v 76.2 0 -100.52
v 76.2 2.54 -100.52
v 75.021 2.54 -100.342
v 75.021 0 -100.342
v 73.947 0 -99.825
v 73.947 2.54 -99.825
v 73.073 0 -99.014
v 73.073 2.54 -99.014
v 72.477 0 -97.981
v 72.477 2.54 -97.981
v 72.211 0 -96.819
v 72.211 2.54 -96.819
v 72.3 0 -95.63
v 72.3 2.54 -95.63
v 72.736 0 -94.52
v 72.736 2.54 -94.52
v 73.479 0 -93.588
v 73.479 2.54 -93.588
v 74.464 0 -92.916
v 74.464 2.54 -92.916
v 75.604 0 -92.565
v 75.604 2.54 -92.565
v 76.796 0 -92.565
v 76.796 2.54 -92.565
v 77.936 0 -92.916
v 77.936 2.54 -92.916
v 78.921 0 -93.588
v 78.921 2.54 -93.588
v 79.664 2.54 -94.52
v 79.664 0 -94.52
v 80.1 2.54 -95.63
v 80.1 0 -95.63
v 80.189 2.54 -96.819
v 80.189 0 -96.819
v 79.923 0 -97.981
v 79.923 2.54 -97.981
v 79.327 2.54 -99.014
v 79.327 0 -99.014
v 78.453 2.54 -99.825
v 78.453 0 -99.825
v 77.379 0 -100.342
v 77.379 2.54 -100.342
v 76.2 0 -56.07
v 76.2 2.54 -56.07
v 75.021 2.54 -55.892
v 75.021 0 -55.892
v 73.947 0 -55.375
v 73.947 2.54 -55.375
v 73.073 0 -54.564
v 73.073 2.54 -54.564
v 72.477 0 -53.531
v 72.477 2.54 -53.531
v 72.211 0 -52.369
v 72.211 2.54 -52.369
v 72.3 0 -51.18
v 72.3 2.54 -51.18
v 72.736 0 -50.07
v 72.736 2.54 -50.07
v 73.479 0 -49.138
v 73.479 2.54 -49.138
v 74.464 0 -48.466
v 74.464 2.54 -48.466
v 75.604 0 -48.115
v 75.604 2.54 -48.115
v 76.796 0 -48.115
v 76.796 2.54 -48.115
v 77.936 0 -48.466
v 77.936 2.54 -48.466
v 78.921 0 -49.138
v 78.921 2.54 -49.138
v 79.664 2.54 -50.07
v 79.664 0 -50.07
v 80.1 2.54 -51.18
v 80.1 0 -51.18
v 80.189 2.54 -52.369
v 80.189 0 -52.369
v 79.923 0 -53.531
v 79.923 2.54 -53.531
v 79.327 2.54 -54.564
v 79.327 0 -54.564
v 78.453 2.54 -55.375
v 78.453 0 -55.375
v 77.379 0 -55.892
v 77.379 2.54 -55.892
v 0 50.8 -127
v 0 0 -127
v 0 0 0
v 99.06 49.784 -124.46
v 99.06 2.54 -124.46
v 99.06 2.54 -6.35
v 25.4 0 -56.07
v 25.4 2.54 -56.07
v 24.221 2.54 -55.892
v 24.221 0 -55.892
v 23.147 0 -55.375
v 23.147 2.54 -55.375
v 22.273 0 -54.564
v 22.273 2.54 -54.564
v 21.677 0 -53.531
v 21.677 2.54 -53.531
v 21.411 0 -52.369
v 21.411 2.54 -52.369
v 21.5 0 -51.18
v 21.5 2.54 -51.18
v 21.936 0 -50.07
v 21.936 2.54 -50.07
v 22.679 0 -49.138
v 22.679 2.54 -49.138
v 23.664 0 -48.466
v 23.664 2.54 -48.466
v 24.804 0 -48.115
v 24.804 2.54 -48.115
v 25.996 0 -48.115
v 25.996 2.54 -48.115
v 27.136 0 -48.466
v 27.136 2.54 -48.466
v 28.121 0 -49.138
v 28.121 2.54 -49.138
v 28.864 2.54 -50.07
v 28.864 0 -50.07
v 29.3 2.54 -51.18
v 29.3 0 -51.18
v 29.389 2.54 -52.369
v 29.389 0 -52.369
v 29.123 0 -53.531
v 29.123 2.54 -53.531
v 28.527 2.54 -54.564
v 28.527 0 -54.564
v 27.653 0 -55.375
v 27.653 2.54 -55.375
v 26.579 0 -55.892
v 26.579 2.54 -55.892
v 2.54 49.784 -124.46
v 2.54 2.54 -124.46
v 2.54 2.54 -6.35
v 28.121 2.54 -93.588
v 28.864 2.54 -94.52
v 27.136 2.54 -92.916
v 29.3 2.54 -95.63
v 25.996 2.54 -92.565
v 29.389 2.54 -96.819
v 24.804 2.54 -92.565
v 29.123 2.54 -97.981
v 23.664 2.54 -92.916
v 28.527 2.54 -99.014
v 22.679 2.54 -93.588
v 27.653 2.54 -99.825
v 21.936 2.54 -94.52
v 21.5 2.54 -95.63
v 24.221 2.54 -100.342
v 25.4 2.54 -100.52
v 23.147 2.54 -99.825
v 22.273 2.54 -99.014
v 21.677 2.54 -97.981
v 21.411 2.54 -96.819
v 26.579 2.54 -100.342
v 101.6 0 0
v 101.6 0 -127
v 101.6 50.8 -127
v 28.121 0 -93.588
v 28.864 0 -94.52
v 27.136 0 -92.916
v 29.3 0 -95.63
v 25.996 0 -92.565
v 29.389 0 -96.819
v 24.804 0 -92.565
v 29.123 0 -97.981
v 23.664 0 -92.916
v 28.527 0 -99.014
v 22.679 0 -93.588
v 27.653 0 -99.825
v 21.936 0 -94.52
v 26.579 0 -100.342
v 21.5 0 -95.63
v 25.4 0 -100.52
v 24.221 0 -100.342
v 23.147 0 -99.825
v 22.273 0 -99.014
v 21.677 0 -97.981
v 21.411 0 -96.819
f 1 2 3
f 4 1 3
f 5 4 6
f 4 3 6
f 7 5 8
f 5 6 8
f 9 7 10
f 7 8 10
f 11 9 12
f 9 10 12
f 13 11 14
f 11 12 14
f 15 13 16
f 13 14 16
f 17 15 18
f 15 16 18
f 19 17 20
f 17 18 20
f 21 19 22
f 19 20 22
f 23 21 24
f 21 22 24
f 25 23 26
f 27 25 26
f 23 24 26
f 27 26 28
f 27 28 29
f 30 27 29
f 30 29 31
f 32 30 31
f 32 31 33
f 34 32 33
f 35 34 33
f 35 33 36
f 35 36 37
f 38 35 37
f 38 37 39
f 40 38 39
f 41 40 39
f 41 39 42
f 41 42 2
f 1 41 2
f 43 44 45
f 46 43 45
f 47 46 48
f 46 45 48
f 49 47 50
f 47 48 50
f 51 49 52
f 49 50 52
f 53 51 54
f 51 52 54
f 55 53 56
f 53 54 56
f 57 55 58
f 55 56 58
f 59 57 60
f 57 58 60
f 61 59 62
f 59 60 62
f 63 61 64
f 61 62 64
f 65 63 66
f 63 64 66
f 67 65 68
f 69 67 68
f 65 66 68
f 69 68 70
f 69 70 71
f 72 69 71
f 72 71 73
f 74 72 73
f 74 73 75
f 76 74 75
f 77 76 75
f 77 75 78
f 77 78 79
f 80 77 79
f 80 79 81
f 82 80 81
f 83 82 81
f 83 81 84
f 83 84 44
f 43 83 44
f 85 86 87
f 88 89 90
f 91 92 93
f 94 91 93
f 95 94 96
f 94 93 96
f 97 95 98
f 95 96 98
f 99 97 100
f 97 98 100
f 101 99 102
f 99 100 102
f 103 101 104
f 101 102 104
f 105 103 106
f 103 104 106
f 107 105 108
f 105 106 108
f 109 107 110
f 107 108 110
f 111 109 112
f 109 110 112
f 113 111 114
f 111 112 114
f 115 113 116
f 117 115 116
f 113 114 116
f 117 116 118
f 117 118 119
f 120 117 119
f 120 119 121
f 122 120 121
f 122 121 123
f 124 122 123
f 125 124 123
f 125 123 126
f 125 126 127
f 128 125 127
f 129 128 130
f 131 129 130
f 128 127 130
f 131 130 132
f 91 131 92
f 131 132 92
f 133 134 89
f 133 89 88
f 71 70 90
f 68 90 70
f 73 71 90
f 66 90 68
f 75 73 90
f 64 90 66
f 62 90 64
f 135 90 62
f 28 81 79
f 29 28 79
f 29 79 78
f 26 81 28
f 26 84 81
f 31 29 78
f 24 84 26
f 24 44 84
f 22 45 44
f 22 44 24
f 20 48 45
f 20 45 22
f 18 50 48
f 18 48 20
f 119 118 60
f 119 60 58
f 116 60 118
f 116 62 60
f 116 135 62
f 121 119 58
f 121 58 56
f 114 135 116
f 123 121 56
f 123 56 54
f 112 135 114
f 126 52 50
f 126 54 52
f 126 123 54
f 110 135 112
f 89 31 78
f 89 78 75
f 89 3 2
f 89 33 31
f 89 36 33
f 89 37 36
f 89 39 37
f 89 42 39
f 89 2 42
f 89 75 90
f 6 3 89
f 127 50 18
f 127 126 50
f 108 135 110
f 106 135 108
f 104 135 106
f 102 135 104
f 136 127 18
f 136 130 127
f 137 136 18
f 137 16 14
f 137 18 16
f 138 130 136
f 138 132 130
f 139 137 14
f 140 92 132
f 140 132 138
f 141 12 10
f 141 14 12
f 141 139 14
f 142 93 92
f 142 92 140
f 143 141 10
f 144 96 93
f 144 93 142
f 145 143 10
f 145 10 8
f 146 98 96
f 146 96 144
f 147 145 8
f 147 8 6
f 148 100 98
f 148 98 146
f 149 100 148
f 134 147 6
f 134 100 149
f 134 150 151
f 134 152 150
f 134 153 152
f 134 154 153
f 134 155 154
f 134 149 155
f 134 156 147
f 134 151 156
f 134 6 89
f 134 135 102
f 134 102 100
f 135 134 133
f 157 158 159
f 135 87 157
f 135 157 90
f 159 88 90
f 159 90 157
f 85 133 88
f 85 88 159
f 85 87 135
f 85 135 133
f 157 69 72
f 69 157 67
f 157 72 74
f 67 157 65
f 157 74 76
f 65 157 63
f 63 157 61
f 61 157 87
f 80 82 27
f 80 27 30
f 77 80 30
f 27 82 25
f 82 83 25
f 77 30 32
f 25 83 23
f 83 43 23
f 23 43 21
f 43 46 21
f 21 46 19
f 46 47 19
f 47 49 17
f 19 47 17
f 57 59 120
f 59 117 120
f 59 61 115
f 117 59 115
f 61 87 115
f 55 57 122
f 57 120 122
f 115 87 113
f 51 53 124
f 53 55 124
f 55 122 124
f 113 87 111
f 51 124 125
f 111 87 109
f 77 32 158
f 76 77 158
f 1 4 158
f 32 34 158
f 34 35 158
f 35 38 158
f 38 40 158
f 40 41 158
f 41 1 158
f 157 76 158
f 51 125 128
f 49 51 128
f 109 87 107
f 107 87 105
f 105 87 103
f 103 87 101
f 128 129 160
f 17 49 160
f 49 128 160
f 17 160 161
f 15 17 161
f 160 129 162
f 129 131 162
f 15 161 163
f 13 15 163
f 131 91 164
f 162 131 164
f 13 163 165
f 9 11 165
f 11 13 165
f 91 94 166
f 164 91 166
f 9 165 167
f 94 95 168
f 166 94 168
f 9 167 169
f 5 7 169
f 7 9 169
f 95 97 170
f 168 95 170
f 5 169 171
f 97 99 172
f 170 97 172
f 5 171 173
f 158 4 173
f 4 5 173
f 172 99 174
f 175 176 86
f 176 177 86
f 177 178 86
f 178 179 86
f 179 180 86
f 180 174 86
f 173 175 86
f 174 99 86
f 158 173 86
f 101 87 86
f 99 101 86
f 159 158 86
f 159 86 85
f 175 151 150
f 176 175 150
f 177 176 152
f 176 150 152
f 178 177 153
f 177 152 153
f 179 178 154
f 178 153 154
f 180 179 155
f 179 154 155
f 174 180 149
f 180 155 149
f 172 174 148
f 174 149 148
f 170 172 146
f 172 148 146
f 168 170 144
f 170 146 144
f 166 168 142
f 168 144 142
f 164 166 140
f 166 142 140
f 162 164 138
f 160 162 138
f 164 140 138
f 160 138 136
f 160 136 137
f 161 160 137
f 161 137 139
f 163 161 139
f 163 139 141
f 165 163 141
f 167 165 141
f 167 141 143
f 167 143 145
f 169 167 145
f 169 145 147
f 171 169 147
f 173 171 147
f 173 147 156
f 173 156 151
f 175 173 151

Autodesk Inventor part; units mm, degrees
ref_plane "YZ Plane" through (0, 0, 0) normal (1, 0, 0) x (0, 1, 0)
ref_plane "XZ Plane" through (0, 0, 0) normal (0, 1, 0) x (-1, 0, 0)
ref_plane "XY Plane" through (0, 0, 0) normal (0, 0, 1) x (1, 0, 0)
sketch "Sketch1" plane through (0, 0, 0) normal (1, 0, 0) x (0, 1, 0)
  line L0 (0, 0) -> (0, -127)
  line L1 (0, -127) -> (50.8, -127)
  line L2 (0, 0) -> (50.8, -127)
  dimension "d0" = 127
  dimension "d1" = 50.8
extrude "Extrusion1" add sketch "Sketch1" along normal blind 101.6
shell "Shell1" thickness 2.54 removed faces 1 at (33.8667, 33.8667, -84.6667)
sketch "Sketch2" plane through (0, 0, -127) normal (0, -1, 0) x (1, 0, 0)
  line L0 (0, 127) -> (0, 0) projected
  line L1 (0, 0) -> (101.6, 0) projected
  line L2 (101.6, 127) -> (101.6, 0) projected
  line L3 (0, 127) -> (101.6, 127) projected
  point P0 (25.4, 30.48)
  point P1 (25.4, 74.93)
  point P2 (76.2, 74.93)
  point P3 (76.2, 30.48)
  dimension "d5" = 30.48
  dimension "d6" = 30.48
  dimension "d7" = 25.4
  dimension "d8" = 25.4
  dimension "d9" = 25.4
  dimension "d10" = 25.4
  dimension "d11" = 44.45
  dimension "d12" = 44.45
hole "Hole1" at (25.4, 0, -96.52) at (25.4, 0, -52.07) at (76.2, 0, -52.07) at (76.2, 0, -96.52) direction (0, 1, 0) diameter 8 depth 19.05 tip angle 118
equation "\"d6\" = d5"
equation "\"d8\" = d7"
equation "\"d9\" = d7"
equation "\"d10\" = d7"
equation "\"d12\" = d11"
properties part number "Bucket" material "Aluminum 6061"
